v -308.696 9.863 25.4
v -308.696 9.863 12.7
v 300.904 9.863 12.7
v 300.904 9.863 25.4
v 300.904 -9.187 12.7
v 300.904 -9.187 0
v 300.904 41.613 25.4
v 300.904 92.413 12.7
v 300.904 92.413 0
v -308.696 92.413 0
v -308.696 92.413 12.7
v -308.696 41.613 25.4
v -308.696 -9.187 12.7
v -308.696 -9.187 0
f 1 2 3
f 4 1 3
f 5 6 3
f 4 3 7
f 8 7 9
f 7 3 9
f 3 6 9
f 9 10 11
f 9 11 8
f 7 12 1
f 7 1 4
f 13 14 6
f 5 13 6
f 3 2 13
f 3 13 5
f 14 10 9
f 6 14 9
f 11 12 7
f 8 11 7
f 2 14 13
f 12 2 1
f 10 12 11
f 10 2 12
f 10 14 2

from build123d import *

# Parameters (mm, degrees)
F0_W      = 609.6
F0_H      = 82.55
F1_DEPTH  = 12.7
F0_H_2    = 19.05
F1_FACE_W = 609.6
F1_FACE_H = 82.55
F2_DEPTH  = 12.7
F3_SIZE2  = 50.8
F3_SIZE   = 12.7


with BuildPart() as f1:
    # F0 (on Top) → F1 (new body)
    with BuildSketch(Plane.XY):
        with Locations((-3.8962736726, 51.1384306475)):
            Rectangle(F0_W, F0_H)
    extrude(amount=F1_DEPTH)

    # F0 (on Top) + F1_face (on face) → F2 (join)
    with BuildSketch(Plane.XY):
        with Locations((-3.8962736726, 51.1384306475)):
            Rectangle(F0_W, F0_H)
        with Locations((-3.8962736726, 0.3384306475)):
            Rectangle(F0_W, F0_H_2)
    with BuildSketch(Plane(origin=(-3.8962736726, 51.1384306475, 12.7), x_dir=(1, 0, 0), z_dir=(0, 0, 1))):
        Rectangle(F1_FACE_W, F1_FACE_H)
    extrude(amount=F2_DEPTH)

    # F3
    f3_edges = [f1.edges().sort_by_distance(p)[0] for p in [
        (-3.896274, 92.413431, 25.4),
    ]]
    f3_side = f1.faces().sort_by_distance((-3.896274, 92.413431, 12.7))[0]
    chamfer(f3_edges, length=F3_SIZE, length2=F3_SIZE2, reference=f3_side)


solid = f1.part
